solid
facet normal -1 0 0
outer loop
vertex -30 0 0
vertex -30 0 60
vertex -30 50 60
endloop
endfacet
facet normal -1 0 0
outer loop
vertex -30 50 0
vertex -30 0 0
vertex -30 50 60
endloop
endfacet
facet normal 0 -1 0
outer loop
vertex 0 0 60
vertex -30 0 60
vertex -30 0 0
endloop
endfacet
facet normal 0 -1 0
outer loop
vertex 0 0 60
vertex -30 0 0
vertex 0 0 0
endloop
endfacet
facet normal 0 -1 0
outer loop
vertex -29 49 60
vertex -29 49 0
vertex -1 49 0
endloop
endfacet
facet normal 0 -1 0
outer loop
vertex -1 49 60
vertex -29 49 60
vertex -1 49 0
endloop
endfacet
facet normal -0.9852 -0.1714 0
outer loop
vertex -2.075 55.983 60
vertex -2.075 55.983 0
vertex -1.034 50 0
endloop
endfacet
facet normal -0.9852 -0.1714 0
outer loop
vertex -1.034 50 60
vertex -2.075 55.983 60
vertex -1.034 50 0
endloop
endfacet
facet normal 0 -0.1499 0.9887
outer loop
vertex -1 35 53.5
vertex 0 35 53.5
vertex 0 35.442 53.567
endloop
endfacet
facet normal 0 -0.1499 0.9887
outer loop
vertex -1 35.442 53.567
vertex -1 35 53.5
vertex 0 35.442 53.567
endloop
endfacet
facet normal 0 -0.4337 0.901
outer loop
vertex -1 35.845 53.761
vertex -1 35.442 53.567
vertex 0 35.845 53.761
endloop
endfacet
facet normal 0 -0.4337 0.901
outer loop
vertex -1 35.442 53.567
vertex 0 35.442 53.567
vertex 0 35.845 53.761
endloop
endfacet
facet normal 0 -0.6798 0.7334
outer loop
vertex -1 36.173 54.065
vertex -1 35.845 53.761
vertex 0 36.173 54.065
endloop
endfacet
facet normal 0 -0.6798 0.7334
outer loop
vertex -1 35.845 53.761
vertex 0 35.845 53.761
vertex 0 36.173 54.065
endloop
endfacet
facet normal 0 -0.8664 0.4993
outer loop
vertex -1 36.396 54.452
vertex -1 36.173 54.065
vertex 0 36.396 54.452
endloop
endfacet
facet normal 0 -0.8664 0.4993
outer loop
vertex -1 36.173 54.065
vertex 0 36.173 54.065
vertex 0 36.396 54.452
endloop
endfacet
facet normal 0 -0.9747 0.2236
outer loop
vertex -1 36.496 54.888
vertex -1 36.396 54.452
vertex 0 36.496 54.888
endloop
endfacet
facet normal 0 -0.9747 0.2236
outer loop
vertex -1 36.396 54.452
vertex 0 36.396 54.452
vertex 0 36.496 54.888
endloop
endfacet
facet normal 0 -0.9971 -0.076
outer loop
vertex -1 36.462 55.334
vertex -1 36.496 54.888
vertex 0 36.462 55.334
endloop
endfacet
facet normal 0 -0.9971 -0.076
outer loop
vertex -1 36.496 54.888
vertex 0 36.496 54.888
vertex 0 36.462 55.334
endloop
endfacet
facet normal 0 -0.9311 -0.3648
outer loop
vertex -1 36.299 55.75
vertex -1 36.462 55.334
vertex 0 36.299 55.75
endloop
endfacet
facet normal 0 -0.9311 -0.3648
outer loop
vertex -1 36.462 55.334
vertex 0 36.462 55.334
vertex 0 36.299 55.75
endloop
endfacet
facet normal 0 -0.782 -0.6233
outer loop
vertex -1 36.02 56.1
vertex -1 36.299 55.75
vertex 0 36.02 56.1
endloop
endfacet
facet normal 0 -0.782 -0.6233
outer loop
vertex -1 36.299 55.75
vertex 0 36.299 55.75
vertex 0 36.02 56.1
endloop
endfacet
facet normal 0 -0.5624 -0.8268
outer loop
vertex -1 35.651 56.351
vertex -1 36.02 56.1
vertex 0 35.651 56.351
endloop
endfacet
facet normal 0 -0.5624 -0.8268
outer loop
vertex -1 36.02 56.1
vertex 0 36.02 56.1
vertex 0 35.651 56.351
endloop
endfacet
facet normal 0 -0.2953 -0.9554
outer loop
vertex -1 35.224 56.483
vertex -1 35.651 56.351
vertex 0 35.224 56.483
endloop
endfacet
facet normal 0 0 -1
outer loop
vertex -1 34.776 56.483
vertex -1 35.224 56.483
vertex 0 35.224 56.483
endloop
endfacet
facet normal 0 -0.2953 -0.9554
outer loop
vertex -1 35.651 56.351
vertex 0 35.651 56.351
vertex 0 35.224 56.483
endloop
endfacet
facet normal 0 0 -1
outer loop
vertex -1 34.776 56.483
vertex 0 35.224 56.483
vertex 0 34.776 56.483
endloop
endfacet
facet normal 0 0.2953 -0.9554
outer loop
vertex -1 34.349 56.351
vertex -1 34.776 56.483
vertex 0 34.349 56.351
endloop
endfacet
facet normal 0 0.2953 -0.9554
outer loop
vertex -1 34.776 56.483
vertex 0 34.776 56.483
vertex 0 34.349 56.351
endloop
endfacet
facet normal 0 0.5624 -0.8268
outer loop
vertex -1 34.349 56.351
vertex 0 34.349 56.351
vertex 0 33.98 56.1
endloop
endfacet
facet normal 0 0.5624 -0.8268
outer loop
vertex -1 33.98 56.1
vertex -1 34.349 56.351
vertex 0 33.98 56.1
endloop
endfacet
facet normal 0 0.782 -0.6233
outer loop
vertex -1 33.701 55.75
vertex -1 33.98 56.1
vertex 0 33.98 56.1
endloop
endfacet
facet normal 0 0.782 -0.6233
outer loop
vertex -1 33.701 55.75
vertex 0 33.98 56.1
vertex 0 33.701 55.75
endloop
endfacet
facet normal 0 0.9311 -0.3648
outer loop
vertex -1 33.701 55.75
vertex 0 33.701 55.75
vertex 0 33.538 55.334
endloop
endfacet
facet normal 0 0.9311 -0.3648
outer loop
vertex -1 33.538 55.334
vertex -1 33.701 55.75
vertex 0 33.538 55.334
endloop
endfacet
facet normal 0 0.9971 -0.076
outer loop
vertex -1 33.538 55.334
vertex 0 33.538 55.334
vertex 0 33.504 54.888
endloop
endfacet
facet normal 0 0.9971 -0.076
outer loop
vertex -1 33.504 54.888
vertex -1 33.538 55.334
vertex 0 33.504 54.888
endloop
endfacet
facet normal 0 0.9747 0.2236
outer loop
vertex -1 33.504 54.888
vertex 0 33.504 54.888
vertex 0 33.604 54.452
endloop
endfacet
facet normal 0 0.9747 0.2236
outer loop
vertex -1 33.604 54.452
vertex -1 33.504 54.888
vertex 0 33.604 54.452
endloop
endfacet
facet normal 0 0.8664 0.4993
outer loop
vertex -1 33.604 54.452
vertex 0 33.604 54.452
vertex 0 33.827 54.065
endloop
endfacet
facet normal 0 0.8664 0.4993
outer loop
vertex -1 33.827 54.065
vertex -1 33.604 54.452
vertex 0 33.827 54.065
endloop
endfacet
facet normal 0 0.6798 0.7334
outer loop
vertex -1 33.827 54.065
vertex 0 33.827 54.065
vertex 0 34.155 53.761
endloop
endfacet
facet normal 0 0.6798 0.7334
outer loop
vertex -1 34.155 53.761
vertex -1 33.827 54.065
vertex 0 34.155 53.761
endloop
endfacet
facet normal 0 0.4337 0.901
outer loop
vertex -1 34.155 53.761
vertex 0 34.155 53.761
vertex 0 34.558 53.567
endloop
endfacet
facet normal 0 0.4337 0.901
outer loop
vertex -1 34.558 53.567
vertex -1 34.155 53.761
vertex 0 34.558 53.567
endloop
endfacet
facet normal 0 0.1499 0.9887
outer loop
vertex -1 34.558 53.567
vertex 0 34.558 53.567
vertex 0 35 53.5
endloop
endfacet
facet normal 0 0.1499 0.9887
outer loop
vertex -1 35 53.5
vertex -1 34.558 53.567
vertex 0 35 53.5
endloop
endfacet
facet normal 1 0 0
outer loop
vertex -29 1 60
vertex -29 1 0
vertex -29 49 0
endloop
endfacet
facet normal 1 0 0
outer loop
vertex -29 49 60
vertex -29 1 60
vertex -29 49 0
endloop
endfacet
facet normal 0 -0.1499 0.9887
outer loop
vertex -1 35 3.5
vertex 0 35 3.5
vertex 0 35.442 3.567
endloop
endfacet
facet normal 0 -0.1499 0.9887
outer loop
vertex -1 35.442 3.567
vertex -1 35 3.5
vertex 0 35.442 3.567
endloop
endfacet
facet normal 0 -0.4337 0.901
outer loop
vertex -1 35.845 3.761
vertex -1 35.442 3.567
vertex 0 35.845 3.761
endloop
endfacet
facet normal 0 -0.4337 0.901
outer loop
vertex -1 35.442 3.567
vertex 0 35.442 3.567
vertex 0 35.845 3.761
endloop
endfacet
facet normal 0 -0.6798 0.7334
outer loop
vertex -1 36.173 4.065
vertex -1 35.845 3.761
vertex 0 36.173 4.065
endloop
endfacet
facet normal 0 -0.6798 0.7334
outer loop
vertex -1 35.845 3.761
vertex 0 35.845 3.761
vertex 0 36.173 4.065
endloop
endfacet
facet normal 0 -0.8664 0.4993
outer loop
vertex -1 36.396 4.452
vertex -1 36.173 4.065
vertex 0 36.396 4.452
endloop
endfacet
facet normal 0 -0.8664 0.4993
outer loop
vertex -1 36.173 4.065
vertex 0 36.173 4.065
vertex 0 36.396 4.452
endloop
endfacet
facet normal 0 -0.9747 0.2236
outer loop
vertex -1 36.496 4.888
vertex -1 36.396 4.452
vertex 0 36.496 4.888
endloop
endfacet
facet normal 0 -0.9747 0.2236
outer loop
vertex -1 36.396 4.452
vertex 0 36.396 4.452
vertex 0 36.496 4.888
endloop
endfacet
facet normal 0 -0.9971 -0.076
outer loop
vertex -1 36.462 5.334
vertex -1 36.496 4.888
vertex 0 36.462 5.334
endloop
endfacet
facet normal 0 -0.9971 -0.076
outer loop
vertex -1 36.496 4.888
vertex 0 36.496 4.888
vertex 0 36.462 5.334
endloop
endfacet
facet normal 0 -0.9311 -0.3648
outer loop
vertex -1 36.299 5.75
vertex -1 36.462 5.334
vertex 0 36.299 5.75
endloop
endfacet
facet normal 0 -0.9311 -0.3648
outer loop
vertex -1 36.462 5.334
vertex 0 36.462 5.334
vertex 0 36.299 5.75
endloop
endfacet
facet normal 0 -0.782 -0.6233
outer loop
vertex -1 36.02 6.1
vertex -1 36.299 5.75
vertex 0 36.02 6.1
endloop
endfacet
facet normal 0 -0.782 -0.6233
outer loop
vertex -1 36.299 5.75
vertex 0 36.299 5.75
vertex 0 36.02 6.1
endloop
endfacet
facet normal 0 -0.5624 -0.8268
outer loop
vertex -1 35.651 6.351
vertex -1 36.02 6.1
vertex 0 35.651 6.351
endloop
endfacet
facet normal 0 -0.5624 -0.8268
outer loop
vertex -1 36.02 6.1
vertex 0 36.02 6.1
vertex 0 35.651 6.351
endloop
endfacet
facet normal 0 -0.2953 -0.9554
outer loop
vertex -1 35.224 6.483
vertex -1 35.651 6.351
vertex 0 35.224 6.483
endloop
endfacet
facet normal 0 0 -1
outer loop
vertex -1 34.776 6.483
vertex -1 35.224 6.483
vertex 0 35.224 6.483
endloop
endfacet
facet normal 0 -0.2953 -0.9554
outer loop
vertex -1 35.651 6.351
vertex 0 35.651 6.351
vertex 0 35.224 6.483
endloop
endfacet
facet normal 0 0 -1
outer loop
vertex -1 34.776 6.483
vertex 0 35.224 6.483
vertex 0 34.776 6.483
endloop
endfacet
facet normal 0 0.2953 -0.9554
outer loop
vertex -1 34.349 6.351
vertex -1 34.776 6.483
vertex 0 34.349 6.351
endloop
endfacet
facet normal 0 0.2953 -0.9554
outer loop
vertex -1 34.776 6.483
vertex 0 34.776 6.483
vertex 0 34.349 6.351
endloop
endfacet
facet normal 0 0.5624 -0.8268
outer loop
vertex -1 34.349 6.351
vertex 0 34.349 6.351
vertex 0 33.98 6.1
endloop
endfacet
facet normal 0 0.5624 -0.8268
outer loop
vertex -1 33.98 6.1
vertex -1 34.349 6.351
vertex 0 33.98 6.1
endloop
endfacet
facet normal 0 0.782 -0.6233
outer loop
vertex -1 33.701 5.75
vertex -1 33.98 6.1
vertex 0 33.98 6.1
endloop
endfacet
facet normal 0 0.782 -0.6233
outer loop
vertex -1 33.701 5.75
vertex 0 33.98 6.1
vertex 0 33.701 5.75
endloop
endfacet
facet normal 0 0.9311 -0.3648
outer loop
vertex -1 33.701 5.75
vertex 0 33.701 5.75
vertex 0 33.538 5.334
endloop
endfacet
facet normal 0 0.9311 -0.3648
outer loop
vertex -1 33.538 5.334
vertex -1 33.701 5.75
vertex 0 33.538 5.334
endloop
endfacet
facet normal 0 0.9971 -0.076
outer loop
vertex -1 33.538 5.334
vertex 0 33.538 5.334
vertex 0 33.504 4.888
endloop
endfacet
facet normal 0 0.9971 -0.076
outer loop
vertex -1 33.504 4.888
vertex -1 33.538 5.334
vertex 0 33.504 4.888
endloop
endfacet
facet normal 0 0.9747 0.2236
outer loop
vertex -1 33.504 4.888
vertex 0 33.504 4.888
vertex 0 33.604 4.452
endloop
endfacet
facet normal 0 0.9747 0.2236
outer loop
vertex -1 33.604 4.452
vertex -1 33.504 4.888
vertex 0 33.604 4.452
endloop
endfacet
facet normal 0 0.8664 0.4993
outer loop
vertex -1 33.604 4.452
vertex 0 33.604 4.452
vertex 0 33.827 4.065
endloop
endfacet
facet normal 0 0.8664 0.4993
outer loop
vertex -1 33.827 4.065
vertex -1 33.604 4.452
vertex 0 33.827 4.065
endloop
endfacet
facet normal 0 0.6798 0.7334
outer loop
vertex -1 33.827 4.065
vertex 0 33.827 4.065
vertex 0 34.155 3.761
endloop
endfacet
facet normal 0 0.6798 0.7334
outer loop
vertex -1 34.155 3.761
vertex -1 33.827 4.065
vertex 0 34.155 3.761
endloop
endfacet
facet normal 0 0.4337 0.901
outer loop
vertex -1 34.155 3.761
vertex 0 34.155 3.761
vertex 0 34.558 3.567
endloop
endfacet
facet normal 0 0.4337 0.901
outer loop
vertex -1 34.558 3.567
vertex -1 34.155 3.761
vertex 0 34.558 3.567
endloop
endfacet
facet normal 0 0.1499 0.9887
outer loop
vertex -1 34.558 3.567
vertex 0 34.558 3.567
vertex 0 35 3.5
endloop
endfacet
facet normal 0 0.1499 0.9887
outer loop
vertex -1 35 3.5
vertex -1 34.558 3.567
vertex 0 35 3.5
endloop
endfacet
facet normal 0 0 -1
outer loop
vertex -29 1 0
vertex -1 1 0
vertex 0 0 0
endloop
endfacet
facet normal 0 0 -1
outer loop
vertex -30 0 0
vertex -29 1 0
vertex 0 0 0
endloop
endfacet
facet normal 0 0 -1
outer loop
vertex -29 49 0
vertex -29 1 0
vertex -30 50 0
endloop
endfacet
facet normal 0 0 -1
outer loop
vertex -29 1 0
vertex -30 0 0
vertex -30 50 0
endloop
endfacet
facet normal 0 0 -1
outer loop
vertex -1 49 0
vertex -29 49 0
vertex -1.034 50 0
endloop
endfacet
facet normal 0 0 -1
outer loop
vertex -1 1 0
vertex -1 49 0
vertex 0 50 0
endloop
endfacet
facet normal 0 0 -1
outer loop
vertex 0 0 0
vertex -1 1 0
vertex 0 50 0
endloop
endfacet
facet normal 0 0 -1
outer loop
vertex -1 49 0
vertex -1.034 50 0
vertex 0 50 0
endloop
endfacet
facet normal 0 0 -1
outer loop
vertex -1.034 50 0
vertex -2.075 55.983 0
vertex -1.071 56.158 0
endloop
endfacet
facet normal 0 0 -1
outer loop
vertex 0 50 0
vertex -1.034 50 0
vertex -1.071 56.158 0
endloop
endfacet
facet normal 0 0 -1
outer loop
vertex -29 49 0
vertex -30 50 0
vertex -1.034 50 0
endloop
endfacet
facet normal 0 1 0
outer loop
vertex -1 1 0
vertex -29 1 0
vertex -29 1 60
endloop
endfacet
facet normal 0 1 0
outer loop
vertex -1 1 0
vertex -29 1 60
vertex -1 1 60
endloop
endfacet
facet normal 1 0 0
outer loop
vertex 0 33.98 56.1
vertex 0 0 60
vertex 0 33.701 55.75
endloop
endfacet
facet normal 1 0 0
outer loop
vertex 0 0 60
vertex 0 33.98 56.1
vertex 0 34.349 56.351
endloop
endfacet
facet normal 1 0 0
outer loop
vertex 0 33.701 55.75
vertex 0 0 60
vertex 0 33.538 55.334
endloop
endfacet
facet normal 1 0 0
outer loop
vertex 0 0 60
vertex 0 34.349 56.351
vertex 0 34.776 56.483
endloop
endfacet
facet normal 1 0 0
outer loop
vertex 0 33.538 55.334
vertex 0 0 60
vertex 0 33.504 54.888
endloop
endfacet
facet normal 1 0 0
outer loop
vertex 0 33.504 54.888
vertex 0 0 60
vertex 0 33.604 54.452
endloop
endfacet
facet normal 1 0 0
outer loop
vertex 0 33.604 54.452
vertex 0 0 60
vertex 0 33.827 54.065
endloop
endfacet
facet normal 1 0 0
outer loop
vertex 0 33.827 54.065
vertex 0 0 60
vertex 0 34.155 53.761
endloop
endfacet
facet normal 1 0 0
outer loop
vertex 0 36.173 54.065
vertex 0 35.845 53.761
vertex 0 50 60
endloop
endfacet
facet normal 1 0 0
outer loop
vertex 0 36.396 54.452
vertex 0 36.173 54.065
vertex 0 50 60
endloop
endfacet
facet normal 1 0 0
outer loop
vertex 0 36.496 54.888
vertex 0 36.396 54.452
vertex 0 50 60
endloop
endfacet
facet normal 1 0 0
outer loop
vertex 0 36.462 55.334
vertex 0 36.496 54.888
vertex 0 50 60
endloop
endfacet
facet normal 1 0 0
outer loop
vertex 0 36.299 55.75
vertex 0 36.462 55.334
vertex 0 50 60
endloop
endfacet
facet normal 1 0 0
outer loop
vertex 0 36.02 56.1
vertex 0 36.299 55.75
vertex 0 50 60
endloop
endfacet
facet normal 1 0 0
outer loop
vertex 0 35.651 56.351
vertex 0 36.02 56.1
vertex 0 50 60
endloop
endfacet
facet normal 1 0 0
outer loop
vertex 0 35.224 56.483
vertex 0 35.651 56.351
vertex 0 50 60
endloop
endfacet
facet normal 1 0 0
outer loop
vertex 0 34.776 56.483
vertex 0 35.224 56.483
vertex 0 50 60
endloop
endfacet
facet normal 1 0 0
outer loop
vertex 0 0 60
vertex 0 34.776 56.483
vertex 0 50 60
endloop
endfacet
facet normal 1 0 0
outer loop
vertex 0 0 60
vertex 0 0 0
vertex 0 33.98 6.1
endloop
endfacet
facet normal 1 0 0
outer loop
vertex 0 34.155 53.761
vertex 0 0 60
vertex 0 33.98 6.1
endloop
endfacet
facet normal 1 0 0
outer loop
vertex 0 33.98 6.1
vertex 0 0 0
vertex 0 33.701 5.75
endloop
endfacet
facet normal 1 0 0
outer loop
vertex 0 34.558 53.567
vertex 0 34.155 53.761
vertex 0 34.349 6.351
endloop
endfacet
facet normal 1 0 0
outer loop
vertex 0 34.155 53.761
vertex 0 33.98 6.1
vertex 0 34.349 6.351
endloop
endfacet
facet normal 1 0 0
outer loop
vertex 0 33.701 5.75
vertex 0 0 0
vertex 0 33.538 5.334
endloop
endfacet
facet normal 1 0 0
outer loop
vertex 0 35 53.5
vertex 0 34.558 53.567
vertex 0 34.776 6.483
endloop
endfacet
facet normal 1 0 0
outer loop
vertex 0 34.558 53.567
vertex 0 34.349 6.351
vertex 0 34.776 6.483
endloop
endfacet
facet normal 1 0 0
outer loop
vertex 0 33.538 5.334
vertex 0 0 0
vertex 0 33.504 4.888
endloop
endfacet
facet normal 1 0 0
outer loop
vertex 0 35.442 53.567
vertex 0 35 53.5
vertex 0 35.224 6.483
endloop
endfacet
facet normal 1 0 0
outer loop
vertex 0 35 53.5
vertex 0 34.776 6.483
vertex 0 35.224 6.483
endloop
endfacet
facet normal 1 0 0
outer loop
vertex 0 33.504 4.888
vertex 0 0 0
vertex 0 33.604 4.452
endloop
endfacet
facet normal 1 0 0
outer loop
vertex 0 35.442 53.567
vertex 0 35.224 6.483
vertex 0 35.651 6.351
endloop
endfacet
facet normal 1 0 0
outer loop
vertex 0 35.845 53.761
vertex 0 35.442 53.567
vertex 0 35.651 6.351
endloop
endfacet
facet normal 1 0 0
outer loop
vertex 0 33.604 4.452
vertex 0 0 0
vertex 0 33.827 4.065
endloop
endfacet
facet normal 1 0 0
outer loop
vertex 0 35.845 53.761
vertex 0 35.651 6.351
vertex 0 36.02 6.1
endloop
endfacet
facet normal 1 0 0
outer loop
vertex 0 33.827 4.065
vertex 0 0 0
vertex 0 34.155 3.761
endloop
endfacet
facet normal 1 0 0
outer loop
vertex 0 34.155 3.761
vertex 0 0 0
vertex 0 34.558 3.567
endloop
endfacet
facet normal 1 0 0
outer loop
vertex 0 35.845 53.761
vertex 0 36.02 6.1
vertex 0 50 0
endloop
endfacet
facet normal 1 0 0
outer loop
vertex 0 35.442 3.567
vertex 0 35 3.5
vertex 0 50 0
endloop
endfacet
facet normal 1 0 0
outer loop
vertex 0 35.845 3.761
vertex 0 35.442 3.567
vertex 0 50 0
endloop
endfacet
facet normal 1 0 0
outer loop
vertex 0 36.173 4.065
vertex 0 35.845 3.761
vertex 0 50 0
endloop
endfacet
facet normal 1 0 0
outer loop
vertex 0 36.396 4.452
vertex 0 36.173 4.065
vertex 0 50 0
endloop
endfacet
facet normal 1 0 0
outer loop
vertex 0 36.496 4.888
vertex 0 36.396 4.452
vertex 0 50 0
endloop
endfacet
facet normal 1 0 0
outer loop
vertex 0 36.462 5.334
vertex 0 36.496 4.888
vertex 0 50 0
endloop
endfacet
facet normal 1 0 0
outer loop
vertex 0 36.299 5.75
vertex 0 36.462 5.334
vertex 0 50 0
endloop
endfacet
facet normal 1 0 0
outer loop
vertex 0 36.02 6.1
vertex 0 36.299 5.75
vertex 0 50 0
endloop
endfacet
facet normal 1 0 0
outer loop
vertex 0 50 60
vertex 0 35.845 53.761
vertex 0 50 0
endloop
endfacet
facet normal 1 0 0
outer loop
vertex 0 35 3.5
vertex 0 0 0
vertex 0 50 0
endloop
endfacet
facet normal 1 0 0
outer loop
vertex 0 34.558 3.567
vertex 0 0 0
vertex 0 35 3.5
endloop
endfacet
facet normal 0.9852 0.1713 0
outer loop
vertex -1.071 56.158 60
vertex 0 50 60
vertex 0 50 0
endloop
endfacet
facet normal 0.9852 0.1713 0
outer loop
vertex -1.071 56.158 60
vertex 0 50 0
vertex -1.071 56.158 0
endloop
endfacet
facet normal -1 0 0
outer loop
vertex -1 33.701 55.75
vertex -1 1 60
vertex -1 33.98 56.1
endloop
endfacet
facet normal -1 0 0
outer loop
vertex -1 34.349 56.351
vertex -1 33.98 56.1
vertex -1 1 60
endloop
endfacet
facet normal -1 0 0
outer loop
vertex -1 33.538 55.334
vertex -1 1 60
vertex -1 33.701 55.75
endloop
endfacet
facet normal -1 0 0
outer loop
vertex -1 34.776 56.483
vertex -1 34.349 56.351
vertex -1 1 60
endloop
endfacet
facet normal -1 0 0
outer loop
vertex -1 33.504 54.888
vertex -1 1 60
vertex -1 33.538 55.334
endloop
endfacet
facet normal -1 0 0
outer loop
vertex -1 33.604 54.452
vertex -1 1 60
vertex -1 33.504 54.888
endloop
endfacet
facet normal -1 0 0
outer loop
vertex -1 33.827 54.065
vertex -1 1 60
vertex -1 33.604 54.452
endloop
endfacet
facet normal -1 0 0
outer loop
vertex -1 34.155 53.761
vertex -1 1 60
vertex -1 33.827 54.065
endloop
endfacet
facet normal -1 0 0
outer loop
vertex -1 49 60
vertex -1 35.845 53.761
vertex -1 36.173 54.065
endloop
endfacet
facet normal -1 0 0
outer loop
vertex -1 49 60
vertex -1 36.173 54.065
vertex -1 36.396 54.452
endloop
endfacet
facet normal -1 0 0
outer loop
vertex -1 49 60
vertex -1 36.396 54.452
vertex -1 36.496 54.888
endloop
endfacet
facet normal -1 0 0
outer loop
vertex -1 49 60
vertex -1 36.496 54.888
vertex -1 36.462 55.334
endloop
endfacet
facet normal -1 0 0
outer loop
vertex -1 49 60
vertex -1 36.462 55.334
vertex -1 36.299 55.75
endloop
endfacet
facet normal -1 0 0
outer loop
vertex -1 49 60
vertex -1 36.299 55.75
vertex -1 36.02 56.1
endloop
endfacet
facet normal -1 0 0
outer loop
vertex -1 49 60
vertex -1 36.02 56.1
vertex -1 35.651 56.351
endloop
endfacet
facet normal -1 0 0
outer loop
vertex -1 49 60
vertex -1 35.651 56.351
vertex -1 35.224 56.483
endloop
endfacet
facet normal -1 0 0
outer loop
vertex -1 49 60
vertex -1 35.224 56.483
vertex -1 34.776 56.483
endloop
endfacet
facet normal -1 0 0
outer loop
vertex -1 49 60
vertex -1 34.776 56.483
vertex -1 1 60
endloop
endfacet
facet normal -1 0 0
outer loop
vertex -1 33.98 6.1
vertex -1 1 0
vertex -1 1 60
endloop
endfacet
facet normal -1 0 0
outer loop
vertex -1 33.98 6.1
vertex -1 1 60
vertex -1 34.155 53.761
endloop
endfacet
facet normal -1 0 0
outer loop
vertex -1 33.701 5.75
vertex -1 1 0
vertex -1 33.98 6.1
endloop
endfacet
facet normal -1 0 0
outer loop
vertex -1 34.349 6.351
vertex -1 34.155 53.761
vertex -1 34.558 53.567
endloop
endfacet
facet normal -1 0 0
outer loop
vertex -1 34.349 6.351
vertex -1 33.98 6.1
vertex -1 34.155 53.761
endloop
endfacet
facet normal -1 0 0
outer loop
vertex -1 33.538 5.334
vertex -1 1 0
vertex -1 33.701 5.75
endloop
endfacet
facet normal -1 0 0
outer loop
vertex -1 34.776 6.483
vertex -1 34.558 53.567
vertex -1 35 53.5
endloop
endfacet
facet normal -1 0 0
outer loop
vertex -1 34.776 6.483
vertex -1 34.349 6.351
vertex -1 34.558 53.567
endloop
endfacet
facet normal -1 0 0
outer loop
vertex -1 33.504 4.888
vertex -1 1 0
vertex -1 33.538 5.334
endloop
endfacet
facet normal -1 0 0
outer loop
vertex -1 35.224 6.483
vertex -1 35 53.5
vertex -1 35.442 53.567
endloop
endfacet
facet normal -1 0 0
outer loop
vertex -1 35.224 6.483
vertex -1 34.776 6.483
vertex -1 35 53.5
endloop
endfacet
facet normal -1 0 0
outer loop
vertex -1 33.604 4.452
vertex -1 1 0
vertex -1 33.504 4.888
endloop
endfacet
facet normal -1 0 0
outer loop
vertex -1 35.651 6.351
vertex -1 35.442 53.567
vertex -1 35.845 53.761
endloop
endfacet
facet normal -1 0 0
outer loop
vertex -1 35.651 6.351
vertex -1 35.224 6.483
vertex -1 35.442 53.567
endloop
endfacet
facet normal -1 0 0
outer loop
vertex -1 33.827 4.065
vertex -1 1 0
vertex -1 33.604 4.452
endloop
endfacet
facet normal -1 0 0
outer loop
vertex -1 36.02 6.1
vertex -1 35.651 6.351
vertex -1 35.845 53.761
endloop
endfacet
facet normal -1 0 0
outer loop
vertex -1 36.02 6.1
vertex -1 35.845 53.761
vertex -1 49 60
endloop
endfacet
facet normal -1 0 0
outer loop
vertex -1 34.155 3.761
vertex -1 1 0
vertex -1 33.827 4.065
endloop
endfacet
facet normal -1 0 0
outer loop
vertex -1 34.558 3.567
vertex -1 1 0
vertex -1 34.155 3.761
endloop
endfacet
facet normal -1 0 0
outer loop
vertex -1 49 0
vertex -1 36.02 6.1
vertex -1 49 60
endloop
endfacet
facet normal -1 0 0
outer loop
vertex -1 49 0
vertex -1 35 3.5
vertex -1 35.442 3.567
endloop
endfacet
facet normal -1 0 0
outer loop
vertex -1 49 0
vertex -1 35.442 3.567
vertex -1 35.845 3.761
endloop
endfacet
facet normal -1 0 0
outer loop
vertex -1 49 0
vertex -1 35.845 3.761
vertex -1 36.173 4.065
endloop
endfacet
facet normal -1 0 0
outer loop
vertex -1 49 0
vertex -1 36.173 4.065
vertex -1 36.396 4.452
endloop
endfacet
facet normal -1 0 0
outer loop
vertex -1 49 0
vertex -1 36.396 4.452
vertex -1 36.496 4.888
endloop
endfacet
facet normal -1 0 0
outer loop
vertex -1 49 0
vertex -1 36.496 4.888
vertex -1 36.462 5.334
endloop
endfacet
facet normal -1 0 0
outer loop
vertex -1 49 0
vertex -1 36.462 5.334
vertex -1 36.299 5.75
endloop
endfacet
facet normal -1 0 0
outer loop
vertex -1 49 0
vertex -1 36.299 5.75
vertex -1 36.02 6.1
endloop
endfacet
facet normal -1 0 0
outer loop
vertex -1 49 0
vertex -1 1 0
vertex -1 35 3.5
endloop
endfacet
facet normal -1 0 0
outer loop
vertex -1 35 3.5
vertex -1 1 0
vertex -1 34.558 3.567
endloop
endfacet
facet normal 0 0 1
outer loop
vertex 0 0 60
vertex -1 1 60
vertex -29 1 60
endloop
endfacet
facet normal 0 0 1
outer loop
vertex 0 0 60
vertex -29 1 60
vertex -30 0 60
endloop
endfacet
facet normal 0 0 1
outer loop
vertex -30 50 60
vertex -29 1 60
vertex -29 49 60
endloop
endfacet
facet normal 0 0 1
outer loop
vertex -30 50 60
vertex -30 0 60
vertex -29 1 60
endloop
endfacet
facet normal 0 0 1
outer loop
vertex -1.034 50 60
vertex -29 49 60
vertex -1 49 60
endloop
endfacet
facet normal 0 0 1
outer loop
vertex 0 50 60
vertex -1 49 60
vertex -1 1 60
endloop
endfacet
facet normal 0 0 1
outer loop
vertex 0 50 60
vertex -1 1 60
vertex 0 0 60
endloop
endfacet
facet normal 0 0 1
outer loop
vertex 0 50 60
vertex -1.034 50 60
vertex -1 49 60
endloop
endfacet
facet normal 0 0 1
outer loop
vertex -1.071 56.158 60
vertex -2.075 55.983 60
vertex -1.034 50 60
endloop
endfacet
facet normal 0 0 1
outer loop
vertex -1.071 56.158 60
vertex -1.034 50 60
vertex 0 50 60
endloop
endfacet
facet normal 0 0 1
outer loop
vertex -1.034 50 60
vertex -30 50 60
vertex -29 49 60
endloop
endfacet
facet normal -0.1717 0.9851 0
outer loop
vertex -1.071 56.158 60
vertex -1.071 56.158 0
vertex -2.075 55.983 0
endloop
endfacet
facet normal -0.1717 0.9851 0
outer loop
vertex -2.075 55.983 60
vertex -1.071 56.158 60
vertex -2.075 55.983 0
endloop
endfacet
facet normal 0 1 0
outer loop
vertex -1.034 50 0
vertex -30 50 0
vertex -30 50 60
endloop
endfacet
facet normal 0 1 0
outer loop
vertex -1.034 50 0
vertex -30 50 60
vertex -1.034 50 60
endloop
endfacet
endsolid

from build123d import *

# Parameters (mm, degrees)
ESBO_O1_W                = 30
ESBO_O1_H                = 50
ESBO_O1_W_2              = 28
ESBO_O1_H_2              = 48
EXTRUS_O_FINA1_DEPTH     = 60
RESSALTO_EXTRUS_O1_DEPTH = 60
ESBO_O3_R                = 1.5
CORTE_EXTRUS_O1_DEPTH    = 10


with BuildPart() as part:
    # Esboço1 → Extrusão-Fina1 (new body)
    with BuildSketch(Plane.XY):
        with Locations((-15, 25)):
            Rectangle(ESBO_O1_W, ESBO_O1_H)
        with Locations((-15, 25)):
            Rectangle(ESBO_O1_W_2, ESBO_O1_H_2, mode=Mode.SUBTRACT)
    extrude(amount=EXTRUS_O_FINA1_DEPTH)

    # Esboço2 → Ressalto-extrusão1 (add, through all)
    with BuildSketch(Plane(origin=(0, 0, 0), x_dir=(-1, 0, 0), z_dir=(0, 0, -1))):
        Polygon((0, 50), (1.071296322, 56.157995634), (2.075314272, 55.983328291), (1.034404539, 50), align=None)
    extrude(amount=-RESSALTO_EXTRUS_O1_DEPTH)

    # Esboço3 → Corte-extrusão1 (cut)
    with BuildSketch(Plane(origin=(0, 0, 0), x_dir=(0, 0, -1), z_dir=(1, 0, 0))):
        with Locations((-55, 35)):
            Circle(ESBO_O3_R)
        with Locations((-5, 35)):
            Circle(ESBO_O3_R)
    extrude(amount=-CORTE_EXTRUS_O1_DEPTH, mode=Mode.SUBTRACT)


solid = part.part
